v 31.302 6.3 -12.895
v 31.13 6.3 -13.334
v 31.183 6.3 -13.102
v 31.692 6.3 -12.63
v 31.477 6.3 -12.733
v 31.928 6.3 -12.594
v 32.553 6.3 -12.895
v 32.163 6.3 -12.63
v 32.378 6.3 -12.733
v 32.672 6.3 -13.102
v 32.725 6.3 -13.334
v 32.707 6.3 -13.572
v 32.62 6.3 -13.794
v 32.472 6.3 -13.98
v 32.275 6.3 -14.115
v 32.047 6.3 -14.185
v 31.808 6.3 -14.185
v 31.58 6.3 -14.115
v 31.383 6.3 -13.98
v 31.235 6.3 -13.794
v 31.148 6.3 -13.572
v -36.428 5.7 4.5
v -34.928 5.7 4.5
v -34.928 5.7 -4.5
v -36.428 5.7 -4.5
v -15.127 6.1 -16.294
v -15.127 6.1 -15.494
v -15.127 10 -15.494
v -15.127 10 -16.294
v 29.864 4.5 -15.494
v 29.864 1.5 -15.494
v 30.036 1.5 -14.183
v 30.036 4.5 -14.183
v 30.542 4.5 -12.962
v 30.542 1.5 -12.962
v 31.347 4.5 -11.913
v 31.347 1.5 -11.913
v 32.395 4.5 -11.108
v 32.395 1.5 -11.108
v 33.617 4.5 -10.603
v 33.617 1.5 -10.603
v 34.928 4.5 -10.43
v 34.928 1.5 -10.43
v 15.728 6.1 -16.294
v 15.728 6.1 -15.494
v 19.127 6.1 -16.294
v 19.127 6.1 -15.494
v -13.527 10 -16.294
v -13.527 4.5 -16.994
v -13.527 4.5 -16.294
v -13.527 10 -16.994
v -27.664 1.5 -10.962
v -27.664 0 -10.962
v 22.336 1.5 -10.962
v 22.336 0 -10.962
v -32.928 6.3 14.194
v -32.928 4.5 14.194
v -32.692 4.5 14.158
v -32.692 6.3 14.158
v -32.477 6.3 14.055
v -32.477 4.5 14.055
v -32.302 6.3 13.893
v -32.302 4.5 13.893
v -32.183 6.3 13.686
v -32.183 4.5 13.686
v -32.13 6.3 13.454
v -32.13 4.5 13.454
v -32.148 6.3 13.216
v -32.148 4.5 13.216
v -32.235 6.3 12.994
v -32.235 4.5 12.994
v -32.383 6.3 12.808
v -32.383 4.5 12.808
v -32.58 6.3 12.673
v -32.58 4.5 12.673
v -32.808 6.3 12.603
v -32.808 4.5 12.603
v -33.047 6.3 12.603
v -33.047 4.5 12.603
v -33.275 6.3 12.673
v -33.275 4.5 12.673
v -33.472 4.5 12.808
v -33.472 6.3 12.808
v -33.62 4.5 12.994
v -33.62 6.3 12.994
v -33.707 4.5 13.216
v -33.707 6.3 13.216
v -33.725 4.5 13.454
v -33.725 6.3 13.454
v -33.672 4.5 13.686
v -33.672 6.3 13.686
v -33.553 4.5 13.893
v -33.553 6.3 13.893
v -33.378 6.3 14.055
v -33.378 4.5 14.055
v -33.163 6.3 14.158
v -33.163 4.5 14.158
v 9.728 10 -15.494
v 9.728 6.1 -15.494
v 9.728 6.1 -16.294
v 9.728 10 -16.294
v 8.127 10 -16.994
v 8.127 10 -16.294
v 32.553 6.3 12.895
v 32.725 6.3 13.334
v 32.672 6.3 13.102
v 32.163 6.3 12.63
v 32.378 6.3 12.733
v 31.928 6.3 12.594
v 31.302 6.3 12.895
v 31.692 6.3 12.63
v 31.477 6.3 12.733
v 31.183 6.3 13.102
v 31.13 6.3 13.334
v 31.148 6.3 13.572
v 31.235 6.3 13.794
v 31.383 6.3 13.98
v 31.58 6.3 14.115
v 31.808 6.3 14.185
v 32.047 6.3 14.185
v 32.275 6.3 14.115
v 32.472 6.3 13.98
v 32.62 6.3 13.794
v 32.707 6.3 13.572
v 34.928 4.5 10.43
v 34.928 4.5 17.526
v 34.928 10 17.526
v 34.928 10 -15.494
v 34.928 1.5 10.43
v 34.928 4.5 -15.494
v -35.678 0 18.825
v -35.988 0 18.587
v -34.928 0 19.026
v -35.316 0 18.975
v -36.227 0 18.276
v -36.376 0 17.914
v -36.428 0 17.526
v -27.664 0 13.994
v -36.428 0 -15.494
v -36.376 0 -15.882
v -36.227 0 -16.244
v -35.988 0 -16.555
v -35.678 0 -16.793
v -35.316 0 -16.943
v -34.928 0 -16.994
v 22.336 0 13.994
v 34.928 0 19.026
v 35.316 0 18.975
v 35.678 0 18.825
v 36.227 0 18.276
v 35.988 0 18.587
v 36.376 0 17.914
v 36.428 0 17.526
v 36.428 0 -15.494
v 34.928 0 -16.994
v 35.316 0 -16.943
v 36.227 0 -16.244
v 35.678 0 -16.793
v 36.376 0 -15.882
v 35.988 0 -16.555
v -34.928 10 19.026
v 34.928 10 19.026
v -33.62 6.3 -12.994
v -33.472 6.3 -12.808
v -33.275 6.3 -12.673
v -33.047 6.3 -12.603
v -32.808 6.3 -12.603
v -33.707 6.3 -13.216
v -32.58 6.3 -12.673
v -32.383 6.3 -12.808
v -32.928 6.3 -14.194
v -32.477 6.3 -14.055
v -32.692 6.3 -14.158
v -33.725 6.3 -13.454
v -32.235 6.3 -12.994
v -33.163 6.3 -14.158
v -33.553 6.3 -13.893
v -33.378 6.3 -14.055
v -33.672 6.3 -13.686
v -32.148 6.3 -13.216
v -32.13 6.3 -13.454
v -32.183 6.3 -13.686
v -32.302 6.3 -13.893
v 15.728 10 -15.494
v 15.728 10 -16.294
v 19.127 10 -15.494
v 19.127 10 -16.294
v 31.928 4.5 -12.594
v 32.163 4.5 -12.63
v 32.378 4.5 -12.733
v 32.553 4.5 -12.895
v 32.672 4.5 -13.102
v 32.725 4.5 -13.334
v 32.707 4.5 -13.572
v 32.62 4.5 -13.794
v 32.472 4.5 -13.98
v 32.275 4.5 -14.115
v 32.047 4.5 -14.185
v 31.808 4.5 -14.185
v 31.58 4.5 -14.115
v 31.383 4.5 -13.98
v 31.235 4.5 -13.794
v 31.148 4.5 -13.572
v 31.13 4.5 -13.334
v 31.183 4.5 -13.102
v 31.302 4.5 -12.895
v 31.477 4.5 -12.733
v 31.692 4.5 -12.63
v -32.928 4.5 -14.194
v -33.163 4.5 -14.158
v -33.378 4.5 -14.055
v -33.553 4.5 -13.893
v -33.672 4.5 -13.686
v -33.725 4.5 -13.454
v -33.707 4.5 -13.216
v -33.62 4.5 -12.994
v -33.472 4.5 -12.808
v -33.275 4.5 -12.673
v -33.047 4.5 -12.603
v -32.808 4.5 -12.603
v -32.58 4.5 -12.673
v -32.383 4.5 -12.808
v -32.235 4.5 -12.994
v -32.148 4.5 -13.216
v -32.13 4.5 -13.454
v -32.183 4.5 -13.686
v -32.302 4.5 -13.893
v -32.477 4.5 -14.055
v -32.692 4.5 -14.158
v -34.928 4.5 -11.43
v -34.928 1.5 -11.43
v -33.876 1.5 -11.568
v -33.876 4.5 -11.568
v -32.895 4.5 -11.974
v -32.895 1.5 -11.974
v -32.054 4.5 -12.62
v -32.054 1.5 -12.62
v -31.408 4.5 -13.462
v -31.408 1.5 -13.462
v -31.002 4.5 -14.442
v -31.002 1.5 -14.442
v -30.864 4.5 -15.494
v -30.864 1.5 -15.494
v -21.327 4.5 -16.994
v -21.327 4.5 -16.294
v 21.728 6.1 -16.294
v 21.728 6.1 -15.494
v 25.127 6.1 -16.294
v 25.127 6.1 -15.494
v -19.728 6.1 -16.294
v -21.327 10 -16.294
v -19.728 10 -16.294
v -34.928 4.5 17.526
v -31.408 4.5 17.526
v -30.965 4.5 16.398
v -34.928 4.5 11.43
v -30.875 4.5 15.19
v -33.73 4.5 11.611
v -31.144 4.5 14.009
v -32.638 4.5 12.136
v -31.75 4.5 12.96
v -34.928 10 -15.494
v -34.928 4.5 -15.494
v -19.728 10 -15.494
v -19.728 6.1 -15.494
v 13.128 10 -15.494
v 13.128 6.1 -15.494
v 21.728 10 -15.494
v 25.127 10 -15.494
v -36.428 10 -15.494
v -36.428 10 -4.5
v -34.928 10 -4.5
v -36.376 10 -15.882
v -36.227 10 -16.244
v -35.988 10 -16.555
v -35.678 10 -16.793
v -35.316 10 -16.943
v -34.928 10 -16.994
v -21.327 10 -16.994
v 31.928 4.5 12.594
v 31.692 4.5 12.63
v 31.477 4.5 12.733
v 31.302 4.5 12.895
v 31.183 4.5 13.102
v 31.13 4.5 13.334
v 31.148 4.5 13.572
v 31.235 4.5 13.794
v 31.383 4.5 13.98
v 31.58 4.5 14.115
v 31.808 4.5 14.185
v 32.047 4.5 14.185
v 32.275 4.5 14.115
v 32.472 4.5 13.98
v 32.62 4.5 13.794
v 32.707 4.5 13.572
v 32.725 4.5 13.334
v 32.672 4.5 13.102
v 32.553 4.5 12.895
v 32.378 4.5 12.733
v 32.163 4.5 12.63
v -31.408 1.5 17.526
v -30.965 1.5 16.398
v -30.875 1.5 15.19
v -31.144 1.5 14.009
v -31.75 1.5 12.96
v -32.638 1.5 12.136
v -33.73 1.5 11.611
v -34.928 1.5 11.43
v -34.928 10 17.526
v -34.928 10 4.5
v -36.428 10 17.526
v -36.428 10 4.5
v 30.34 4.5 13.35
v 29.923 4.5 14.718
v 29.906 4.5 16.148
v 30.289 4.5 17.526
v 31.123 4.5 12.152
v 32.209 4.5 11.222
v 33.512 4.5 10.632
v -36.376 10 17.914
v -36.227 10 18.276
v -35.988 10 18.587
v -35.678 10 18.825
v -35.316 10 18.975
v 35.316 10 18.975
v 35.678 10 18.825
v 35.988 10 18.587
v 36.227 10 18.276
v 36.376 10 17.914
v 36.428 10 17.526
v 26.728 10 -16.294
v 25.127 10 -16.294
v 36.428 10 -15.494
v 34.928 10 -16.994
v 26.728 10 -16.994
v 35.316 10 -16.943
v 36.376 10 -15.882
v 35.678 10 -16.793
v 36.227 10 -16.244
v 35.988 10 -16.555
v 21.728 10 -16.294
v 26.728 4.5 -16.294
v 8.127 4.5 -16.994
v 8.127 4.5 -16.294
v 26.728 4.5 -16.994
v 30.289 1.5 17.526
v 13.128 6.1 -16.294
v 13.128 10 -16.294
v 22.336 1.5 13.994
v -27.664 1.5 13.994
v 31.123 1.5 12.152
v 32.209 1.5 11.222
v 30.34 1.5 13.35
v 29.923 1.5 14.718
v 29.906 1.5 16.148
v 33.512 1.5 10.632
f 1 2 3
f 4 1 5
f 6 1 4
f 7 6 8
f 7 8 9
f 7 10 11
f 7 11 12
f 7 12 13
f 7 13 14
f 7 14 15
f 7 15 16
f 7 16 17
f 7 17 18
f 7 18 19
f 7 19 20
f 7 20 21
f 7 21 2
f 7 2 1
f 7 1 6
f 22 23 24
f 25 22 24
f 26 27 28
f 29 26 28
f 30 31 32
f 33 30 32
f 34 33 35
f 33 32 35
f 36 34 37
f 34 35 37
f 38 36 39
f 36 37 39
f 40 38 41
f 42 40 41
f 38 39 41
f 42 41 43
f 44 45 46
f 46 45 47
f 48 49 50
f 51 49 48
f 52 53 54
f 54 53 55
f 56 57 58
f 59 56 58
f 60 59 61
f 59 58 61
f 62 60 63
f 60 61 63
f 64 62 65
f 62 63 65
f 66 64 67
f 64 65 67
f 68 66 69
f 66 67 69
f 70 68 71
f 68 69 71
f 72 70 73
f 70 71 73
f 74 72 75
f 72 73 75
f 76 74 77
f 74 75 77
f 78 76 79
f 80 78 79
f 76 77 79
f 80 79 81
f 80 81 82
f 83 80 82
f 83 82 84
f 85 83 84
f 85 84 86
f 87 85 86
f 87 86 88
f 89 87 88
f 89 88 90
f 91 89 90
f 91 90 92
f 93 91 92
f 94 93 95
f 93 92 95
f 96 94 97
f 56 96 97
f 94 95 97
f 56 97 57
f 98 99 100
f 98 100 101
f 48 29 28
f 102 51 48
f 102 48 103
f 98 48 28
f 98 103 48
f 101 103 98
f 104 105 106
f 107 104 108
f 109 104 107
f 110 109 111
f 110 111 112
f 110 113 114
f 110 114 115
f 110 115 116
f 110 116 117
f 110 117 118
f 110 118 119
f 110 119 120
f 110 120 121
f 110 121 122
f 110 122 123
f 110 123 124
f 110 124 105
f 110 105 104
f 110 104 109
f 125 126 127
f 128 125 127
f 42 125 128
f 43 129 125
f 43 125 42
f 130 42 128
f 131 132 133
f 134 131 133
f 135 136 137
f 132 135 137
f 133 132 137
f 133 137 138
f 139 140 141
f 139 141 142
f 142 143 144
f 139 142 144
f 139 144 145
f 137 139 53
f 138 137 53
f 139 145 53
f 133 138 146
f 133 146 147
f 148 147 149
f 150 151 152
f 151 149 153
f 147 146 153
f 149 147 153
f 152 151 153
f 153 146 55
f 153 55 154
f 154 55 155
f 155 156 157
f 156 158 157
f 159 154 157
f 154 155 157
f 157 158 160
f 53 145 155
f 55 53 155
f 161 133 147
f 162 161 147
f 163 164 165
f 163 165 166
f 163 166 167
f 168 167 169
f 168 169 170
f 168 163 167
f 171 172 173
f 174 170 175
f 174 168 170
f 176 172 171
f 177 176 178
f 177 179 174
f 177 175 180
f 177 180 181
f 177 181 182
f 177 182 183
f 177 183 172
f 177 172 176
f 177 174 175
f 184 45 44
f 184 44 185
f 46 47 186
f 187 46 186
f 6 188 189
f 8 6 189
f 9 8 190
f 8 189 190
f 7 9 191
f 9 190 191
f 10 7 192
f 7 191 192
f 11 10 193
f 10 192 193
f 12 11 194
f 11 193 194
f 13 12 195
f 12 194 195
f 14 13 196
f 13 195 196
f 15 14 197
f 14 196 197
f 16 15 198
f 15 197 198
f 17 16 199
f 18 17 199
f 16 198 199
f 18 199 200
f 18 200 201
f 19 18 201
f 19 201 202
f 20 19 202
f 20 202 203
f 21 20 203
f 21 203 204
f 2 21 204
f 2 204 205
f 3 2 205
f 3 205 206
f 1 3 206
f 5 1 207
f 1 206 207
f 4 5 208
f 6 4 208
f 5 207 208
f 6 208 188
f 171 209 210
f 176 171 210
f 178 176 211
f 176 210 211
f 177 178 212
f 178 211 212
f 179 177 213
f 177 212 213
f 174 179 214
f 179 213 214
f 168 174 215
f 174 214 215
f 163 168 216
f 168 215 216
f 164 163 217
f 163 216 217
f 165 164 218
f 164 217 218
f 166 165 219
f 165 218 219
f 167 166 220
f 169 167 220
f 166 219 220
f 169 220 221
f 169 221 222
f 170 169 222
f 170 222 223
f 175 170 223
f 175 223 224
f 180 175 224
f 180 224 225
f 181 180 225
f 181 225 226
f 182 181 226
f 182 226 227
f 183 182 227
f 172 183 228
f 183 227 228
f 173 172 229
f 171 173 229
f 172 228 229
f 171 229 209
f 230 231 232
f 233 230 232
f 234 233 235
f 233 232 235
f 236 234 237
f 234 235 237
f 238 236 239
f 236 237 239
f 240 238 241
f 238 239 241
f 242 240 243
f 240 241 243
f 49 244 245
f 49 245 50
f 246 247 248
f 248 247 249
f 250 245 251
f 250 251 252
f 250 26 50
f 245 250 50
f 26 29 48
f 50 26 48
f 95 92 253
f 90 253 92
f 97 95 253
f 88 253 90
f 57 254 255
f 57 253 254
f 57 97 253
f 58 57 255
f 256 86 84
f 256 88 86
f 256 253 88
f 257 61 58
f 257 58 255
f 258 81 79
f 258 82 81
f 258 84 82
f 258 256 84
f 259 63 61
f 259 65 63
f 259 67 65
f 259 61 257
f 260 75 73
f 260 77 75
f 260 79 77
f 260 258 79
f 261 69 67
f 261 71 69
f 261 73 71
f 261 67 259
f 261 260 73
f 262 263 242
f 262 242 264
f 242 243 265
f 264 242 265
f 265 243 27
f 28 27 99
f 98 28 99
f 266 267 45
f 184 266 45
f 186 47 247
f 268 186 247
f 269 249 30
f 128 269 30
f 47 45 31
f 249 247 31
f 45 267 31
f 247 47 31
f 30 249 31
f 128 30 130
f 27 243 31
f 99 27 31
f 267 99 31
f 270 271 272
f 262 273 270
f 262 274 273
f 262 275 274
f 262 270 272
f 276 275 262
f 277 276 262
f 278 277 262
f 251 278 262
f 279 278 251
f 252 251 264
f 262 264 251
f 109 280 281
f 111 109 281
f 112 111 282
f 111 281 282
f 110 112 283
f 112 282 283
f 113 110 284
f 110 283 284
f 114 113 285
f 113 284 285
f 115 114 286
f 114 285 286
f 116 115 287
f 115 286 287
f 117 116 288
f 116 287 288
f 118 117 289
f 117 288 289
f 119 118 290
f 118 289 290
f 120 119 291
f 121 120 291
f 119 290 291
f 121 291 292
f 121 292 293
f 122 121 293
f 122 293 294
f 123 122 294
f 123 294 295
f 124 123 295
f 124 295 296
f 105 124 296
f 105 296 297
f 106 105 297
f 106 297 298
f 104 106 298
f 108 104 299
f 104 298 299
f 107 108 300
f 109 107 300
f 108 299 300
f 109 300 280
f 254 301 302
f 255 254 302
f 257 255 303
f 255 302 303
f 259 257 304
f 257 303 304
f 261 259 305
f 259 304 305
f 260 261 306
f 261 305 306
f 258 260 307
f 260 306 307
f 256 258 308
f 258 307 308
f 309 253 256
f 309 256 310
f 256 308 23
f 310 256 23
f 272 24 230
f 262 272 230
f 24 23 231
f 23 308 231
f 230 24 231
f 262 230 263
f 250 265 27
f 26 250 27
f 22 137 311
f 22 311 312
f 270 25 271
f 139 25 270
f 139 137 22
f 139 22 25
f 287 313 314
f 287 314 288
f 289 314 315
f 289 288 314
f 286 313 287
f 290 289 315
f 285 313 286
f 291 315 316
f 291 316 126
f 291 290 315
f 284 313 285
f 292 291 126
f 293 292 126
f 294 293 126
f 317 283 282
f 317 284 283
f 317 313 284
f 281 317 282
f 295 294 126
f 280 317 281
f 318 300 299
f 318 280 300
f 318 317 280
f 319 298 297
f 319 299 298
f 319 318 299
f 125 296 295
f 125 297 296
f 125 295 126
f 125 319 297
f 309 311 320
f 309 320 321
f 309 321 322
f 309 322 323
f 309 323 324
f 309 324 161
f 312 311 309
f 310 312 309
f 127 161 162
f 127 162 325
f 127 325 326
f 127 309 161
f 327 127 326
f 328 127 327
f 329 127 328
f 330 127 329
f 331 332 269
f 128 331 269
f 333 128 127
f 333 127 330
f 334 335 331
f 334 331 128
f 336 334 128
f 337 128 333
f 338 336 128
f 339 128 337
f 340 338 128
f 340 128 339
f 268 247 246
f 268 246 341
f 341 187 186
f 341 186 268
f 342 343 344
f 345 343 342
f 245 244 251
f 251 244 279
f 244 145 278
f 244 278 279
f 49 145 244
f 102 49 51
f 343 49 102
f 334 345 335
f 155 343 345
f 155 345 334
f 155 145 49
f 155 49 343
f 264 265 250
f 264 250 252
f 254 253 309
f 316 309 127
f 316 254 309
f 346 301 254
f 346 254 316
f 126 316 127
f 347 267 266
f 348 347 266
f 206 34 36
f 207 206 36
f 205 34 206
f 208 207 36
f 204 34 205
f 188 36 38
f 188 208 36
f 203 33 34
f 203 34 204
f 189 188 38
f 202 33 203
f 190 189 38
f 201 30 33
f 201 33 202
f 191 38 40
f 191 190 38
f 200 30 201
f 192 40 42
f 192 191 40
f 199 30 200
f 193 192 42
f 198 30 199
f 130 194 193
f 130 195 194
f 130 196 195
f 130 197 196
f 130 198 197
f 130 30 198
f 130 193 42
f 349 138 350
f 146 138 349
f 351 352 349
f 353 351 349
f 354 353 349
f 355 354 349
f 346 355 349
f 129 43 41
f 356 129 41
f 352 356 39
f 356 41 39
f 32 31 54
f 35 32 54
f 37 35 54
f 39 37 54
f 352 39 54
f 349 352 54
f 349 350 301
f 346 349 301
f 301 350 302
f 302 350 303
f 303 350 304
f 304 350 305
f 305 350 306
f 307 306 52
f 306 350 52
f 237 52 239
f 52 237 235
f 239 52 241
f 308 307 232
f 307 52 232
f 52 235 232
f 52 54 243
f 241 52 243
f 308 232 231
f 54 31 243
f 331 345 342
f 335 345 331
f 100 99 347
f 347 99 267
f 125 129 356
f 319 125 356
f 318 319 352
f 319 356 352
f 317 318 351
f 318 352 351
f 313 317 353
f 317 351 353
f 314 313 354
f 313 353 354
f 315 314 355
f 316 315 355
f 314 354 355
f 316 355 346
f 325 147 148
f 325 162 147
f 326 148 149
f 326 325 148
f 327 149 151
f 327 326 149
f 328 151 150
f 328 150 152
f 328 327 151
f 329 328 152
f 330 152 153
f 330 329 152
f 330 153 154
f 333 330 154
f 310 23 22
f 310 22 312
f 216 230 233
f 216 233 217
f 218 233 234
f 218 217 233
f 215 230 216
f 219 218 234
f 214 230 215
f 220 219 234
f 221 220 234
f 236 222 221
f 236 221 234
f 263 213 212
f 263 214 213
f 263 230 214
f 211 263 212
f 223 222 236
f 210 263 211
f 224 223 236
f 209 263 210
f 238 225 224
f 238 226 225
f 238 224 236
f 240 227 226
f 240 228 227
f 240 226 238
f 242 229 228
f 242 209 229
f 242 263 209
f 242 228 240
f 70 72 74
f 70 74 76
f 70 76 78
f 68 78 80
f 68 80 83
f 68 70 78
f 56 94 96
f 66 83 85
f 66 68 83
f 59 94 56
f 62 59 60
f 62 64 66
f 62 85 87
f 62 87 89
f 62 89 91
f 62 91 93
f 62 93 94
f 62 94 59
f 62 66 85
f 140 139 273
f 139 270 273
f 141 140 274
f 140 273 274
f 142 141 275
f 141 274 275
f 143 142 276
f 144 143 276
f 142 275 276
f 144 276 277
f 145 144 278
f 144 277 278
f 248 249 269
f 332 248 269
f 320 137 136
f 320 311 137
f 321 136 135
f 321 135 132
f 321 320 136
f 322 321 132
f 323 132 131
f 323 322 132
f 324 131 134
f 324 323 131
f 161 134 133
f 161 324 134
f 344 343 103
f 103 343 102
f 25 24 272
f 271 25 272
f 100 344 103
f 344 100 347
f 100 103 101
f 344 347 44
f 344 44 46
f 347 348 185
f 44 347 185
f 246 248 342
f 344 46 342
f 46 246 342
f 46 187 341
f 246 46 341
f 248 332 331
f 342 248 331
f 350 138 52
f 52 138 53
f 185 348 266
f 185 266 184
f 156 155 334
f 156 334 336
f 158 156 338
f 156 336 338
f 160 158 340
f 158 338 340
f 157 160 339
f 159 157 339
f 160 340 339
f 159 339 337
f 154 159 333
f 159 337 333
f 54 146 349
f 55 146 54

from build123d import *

# Parameters (mm, degrees)
EXTRUDE_1_DEPTH         = 1.5
CUT_EXTRUDE_2_REACH     = 41.107
SKETCH_1_6_W            = 50
SKETCH_1_6_H            = 24.956
EXTRUDE_1_2_OUTLINE_W   = 72.855
EXTRUDE_1_2_OUTLINE_H   = 36.02
EXTRUDE_1_2_OUTLINE_W_2 = 69.855
EXTRUDE_1_2_OUTLINE_H_2 = 33.02
EXTRUDE_1_2_DEPTH       = 10
FILLET_1_R              = 1.5
EXTRUDE_2_DEPTH         = 3
SKETCH_3_R              = 0.8
EXTRUDE_3_DEPTH         = 1.8
CUT_EXTRUDE_3_REACH     = 76.522
SKETCH_4_W              = 9
SKETCH_4_H              = 4.3
CUT_EXTRUDE_4_REACH     = 53.172
SKETCH_5_W              = 3.4
SKETCH_5_H              = 4
SKETCH_5_W_2            = 4.6
CUT_EXTRUDE_START       = -1.5
SKETCH_5_6_W            = 7.8
SKETCH_5_6_H            = 7.2
SKETCH_5_6_W_2          = 18.6
CUT_EXTRUDE_6_DEPTH     = 0.7


# Read off the part's stored shape, not the designer's step: 拉伸-薄壁1
with BuildPart() as part:
    # 草图1 → Extrude 1 (new body)
    with BuildSketch(Plane(origin=(0, 0, 0), x_dir=(1, 0, 0), z_dir=(0, 1, 0))):
        Polygon((-34.9275, 15.494), (34.9275, 15.494), (34.9275, -15.494), (34.9275, -17.526), (-34.9275, -17.526), (-34.9275, -15.494), align=None)
    extrude(amount=EXTRUDE_1_DEPTH)

    # 草图1<6> → 切除-拉伸2 (cut, up to next)
    with BuildSketch(Plane(origin=(0, 0, 0), x_dir=(1, 0, 0), z_dir=(0, 1, 0)), mode=Mode.PRIVATE) as cut_extrude_2_sk1:
        with Locations((-2.6635, -1.516)):
            Rectangle(SKETCH_1_6_W, SKETCH_1_6_H)
    cut_extrude_2_tool1 = extrude(cut_extrude_2_sk1.sketch, amount=CUT_EXTRUDE_2_REACH, mode=Mode.PRIVATE) & part.part
    add(cut_extrude_2_tool1.solids().sort_by_distance((-2.6635, 0, 1.516))[0], mode=Mode.SUBTRACT)



with BuildPart() as body_2:
    # Extrude 1 2 outline → Extrude 1 2 (new body)
    with BuildSketch(Plane(origin=(0, 0, 0), x_dir=(1, 0, 0), z_dir=(0, 1, 0))):
        with Locations((0, -1.016)):
            Rectangle(EXTRUDE_1_2_OUTLINE_W, EXTRUDE_1_2_OUTLINE_H)
        with Locations((0, -1.016)):
            Rectangle(EXTRUDE_1_2_OUTLINE_W_2, EXTRUDE_1_2_OUTLINE_H_2, mode=Mode.SUBTRACT)
    extrude(amount=EXTRUDE_1_2_DEPTH)

    # 圆角1
    fillet_1_edges = [body_2.edges().sort_by_distance(p)[0] for p in [
        (-36.4275, 5, -16.994),
        (-36.4275, 5, 19.026),
        (36.4275, 5, 19.026),
        (36.4275, 5, -16.994),
    ]]
    fillet(fillet_1_edges, radius=FILLET_1_R)


with BuildPart() as part_1:
    add(part.part)

    add(body_2.part)  # 凸台-拉伸2 merges body 2
    # 草图2 → 凸台-拉伸2 (add)
    with BuildSketch(Plane(origin=(0, 1.5, 0), x_dir=(1, 0, 0), z_dir=(0, 1, 0))):
        with BuildLine():
            ThreePointArc((-31.407972759, -17.526), (-31.407972759, -13.462), (-34.9275, -11.43))
            Line((-34.9275, -11.43), (-34.9275, -17.526))
            Line((-34.9275, -17.526), (-31.407972759, -17.526))
        make_face()
        with BuildLine():
            ThreePointArc((-34.9275, 11.43), (-32.053818041, 12.620318041), (-30.8635, 15.494))
            Line((-30.8635, 15.494), (-34.9275, 15.494))
            Line((-34.9275, 15.494), (-34.9275, 11.43))
        make_face()
        with BuildLine():
            Line((34.9275, 15.494), (29.8635, 15.494))
            ThreePointArc((29.8635, 15.494), (31.34671126, 11.91321126), (34.9275, 10.43))
            Line((34.9275, 10.43), (34.9275, 15.494))
        make_face()
        with BuildLine():
            Line((34.9275, -17.526), (34.9275, -10.43))
            ThreePointArc((34.9275, -10.43), (30.688741691, -12.723255696), (30.289065781, -17.526))
            Line((30.289065781, -17.526), (34.9275, -17.526))
        make_face()
    extrude(amount=EXTRUDE_2_DEPTH)

    # 草图3 → 凸台-拉伸3 (add)
    with BuildSketch(Plane(origin=(0, 4.5, 0), x_dir=(1, 0, 0), z_dir=(0, 1, 0))):
        with Locations(Location((-32.9275, -13.394, 0), (0, 0, 270))):
            Circle(SKETCH_3_R)
        with Locations(Location((-32.9275, 13.394, 0), (0, 0, 90))):
            Circle(SKETCH_3_R)
        with Locations(Location((31.9275, -13.394, 0), (0, 0, 90))):
            Circle(SKETCH_3_R)
        with Locations(Location((31.9275, 13.394, 0), (0, 0, 270))):
            Circle(SKETCH_3_R)
    extrude(amount=EXTRUDE_3_DEPTH)

    # 草图4 → 切除-拉伸3 (cut, up to next)
    with BuildSketch(Plane(origin=(-34.9275, 0, 0), x_dir=(0, 0, -1), z_dir=(1, 0, 0)), mode=Mode.PRIVATE) as cut_extrude_3_sk1:
        with Locations((0, 7.85)):
            Rectangle(SKETCH_4_W, SKETCH_4_H)
    cut_extrude_3_tool1 = extrude(cut_extrude_3_sk1.sketch, amount=-CUT_EXTRUDE_3_REACH, mode=Mode.PRIVATE) & part_1.part
    add(cut_extrude_3_tool1.solids().sort_by_distance((-34.9275, 7.85, 0))[0], mode=Mode.SUBTRACT)

    # 草图5 → 切除-拉伸4 (cut, up to next)
    with BuildSketch(Plane.XY.offset(-15.494), mode=Mode.PRIVATE) as cut_extrude_4_sk1:
        with Locations((11.4275, 8.1)):
            Rectangle(SKETCH_5_W, SKETCH_5_H)
    cut_extrude_4_tool1 = extrude(cut_extrude_4_sk1.sketch, amount=-CUT_EXTRUDE_4_REACH, mode=Mode.PRIVATE) & part_1.part
    # 草图5 → 切除-拉伸4 (cut, up to next)
    with BuildSketch(Plane.XY.offset(-15.494), mode=Mode.PRIVATE) as cut_extrude_4_sk2:
        with Locations((17.4275, 8.1)):
            Rectangle(SKETCH_5_W, SKETCH_5_H)
    cut_extrude_4_tool2 = extrude(cut_extrude_4_sk2.sketch, amount=-CUT_EXTRUDE_4_REACH, mode=Mode.PRIVATE) & part_1.part
    # 草图5 → 切除-拉伸4 (cut, up to next)
    with BuildSketch(Plane.XY.offset(-15.494), mode=Mode.PRIVATE) as cut_extrude_4_sk3:
        with Locations((23.4275, 8.1)):
            Rectangle(SKETCH_5_W, SKETCH_5_H)
    cut_extrude_4_tool3 = extrude(cut_extrude_4_sk3.sketch, amount=-CUT_EXTRUDE_4_REACH, mode=Mode.PRIVATE) & part_1.part
    # 草图5 → 切除-拉伸4 (cut, up to next)
    with BuildSketch(Plane.XY.offset(-15.494), mode=Mode.PRIVATE) as cut_extrude_4_sk4:
        with Locations((-17.4275, 8.1)):
            Rectangle(SKETCH_5_W_2, SKETCH_5_H)
    cut_extrude_4_tool4 = extrude(cut_extrude_4_sk4.sketch, amount=-CUT_EXTRUDE_4_REACH, mode=Mode.PRIVATE) & part_1.part
    add(cut_extrude_4_tool1.solids().sort_by_distance((11.4275, 8.1, -15.494))[0], mode=Mode.SUBTRACT)
    add(cut_extrude_4_tool2.solids().sort_by_distance((17.4275, 8.1, -15.494))[0], mode=Mode.SUBTRACT)
    add(cut_extrude_4_tool3.solids().sort_by_distance((23.4275, 8.1, -15.494))[0], mode=Mode.SUBTRACT)
    add(cut_extrude_4_tool4.solids().sort_by_distance((-17.4275, 8.1, -15.494))[0], mode=Mode.SUBTRACT)

    # 草图5<6> → 切除-拉伸6 (cut)
    with BuildSketch(Plane.XY.offset(-15.494).offset(CUT_EXTRUDE_START)):
        with Locations((-17.4275, 8.1)):
            Rectangle(SKETCH_5_6_W, SKETCH_5_6_H)
        with Locations((17.4275, 8.1)):
            Rectangle(SKETCH_5_6_W_2, SKETCH_5_6_H)
    extrude(amount=CUT_EXTRUDE_6_DEPTH, mode=Mode.SUBTRACT)


solid = part_1.part
